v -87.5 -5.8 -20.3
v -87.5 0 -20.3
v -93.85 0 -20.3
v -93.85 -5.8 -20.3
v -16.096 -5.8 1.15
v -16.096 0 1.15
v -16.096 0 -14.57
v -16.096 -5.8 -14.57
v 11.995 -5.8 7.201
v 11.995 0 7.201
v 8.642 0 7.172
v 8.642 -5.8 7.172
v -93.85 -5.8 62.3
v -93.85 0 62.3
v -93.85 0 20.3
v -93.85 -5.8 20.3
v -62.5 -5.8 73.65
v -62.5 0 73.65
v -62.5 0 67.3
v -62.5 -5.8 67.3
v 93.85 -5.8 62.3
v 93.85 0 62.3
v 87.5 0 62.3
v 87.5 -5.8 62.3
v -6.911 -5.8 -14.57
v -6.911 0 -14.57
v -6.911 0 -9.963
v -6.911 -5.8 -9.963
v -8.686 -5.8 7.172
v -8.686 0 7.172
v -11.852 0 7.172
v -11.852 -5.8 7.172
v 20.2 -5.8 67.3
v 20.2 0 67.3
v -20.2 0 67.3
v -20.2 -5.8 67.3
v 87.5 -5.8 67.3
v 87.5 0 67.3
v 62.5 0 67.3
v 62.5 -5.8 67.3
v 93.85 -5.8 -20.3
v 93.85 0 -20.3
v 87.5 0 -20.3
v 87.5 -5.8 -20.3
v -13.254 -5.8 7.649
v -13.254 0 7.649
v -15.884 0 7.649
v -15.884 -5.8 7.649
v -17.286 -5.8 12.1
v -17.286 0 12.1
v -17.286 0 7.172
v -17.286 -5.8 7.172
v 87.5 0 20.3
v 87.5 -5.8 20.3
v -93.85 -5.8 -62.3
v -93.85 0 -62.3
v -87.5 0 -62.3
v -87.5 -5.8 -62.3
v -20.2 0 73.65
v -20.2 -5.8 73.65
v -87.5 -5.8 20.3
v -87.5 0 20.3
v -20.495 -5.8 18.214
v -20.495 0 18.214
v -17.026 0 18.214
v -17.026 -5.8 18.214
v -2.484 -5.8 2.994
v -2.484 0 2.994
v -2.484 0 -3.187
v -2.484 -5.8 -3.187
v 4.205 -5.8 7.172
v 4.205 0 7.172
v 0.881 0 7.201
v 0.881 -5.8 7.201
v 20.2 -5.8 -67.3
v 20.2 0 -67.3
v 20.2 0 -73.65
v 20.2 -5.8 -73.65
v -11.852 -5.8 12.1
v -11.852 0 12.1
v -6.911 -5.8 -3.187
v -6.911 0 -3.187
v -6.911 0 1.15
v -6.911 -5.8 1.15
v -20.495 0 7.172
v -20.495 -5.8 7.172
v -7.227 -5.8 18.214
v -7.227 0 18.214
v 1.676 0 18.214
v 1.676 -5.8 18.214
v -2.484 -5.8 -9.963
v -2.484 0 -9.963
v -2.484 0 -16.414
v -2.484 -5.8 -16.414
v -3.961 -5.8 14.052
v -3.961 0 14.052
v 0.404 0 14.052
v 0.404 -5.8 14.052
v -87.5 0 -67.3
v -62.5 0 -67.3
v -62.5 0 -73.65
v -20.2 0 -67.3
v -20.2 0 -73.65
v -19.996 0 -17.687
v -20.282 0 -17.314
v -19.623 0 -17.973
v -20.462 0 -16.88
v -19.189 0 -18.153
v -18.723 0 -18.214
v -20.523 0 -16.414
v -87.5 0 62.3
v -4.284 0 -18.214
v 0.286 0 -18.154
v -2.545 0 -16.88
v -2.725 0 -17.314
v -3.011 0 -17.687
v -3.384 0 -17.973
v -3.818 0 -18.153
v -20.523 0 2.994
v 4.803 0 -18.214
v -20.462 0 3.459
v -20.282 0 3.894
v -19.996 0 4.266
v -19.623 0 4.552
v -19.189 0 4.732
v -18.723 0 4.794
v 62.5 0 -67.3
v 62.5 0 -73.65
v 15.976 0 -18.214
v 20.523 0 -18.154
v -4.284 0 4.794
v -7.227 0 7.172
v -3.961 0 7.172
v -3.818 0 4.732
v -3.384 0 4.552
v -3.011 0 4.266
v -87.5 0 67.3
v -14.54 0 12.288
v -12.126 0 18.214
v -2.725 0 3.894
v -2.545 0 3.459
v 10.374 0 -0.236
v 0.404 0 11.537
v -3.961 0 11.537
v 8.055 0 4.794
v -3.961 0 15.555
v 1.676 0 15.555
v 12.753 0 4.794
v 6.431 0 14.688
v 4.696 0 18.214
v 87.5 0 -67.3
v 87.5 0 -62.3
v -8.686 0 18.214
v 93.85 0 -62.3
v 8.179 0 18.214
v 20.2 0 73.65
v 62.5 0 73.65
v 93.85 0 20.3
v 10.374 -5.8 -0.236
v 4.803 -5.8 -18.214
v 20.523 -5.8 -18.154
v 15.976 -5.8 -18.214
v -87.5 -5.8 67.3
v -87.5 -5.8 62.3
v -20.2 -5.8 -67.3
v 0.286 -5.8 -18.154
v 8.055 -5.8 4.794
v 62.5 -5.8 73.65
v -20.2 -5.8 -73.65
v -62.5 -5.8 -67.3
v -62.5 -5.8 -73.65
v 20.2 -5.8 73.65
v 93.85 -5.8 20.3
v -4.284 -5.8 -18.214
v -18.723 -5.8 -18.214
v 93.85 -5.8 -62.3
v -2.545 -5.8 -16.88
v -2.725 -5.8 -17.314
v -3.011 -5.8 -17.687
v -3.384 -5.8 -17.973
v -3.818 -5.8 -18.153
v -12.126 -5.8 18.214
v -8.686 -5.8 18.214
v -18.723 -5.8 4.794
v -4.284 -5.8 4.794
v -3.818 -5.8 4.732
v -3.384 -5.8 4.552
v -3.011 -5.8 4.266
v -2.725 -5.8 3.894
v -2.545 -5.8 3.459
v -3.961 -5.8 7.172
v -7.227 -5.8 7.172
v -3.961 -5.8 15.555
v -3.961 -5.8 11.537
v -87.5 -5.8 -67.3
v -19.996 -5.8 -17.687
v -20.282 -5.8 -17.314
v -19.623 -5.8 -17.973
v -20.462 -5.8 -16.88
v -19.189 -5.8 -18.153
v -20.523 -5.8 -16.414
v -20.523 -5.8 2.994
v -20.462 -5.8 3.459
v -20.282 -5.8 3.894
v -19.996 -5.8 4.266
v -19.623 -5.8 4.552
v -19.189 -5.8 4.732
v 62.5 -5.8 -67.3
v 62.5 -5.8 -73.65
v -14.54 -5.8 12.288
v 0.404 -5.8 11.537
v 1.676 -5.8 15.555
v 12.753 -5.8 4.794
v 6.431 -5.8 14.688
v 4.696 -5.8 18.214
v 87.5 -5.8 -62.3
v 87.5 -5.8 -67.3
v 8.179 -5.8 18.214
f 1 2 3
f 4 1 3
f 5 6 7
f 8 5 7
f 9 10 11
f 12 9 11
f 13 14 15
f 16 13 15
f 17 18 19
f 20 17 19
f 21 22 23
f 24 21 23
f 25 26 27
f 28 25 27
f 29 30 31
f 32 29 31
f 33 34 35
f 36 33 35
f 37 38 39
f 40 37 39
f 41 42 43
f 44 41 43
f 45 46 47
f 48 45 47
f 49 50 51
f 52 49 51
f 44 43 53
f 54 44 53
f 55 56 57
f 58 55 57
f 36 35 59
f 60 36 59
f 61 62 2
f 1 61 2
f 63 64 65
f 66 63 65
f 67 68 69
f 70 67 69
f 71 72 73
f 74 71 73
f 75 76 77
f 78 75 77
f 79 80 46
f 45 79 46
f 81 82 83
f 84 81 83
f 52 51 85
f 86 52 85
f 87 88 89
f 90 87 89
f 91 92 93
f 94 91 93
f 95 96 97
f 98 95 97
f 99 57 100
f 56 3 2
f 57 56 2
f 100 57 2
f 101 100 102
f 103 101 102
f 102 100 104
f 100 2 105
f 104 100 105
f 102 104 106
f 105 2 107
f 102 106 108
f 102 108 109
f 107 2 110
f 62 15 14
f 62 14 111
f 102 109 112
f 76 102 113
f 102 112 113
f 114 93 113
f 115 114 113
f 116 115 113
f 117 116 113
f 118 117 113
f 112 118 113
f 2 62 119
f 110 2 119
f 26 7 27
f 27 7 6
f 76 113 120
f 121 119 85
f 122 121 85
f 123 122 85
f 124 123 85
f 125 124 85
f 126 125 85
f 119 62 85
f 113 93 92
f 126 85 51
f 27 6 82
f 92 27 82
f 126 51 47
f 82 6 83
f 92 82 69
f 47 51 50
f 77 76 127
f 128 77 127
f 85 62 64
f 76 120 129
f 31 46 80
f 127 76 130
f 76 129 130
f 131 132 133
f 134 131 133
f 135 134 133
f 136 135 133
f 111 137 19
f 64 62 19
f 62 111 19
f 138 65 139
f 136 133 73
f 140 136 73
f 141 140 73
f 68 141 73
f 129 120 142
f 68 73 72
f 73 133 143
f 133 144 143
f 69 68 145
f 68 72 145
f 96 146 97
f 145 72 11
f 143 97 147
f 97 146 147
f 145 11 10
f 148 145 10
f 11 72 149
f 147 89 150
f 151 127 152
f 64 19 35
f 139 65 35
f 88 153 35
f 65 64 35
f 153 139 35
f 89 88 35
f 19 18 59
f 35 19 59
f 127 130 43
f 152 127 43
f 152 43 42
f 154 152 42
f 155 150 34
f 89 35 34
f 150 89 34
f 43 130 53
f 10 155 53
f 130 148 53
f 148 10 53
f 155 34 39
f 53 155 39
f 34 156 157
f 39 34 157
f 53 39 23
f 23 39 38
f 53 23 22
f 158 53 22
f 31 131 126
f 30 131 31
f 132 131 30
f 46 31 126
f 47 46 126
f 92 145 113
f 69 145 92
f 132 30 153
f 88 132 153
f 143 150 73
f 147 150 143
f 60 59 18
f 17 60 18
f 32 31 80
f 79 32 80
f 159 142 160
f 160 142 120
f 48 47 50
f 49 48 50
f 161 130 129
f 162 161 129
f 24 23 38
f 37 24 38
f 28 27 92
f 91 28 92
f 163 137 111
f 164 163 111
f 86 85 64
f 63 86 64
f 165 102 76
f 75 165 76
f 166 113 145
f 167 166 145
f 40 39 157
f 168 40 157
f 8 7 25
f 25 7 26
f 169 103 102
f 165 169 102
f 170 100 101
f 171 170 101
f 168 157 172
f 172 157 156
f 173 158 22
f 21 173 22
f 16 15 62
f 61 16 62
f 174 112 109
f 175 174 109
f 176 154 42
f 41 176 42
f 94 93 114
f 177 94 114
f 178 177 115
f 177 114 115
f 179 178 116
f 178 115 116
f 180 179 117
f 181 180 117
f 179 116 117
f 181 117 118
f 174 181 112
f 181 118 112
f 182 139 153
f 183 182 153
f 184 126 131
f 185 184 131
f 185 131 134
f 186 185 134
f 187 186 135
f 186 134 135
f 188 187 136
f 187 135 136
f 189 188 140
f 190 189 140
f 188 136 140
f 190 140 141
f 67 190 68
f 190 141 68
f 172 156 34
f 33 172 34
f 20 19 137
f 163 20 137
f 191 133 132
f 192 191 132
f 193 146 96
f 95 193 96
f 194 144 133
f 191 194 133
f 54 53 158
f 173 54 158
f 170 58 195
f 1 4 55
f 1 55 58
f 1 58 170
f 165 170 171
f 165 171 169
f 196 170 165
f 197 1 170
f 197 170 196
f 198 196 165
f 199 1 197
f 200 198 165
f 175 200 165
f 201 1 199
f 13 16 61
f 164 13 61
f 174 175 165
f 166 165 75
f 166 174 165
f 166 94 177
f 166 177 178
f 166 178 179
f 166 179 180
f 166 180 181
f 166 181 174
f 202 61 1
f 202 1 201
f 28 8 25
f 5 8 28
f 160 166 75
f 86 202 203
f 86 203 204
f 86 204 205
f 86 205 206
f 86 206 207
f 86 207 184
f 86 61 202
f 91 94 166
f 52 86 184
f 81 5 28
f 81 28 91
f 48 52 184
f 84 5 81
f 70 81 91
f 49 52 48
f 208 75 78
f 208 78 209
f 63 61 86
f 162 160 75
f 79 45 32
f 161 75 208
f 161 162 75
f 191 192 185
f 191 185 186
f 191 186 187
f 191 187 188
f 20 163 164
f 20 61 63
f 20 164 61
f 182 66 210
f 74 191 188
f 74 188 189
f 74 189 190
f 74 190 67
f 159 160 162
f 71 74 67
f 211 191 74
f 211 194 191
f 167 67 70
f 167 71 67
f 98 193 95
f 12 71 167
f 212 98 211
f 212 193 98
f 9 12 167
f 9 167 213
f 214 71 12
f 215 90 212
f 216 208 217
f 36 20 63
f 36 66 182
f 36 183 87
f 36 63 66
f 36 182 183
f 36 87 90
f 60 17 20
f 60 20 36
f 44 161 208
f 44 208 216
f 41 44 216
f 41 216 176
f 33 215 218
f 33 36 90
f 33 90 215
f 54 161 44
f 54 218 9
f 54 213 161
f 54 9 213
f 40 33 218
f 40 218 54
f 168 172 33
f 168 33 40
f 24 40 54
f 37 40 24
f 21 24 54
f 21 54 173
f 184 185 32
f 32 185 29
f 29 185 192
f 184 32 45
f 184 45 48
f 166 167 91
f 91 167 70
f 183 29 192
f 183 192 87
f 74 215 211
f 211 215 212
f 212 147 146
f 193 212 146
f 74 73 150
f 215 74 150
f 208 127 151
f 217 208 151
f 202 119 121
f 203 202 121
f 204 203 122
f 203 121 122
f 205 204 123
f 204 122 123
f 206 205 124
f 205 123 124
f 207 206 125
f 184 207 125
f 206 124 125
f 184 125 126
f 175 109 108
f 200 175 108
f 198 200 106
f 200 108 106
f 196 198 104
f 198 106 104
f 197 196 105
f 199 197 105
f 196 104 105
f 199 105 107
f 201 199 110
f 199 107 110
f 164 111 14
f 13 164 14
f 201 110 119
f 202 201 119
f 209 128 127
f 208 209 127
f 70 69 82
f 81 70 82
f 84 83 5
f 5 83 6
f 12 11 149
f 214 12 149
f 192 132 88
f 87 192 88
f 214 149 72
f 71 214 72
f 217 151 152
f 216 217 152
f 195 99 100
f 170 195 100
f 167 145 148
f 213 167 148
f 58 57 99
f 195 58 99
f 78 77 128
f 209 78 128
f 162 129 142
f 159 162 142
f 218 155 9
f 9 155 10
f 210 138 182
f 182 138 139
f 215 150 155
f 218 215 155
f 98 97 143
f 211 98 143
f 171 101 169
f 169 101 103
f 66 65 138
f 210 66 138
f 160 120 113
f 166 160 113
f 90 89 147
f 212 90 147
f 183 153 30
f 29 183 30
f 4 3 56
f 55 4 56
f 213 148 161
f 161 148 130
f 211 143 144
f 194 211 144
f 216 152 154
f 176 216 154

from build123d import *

# Parameters (mm, degrees)
F1_DEPTH = 5.8


with BuildPart() as f1:
    # F0 (on Front) → F1 (new body)
    with BuildSketch(Plane.XZ):
        Polygon((87.5, 62.3), (87.5, 67.3), (62.5, 67.3), (62.5, 73.65), (20.2, 73.65), (20.2, 67.3), (-20.2, 67.3), (-20.2, 73.65), (-62.5, 73.65), (-62.5, 67.3), (-87.5, 67.3), (-87.5, 62.3), (-93.85, 62.3), (-93.85, 20.3), (-87.5, 20.3), (-87.5, -20.3), (-93.85, -20.3), (-93.85, -62.3), (-87.5, -62.3), (-87.5, -67.3), (-62.5, -67.3), (-62.5, -73.65), (-20.2, -73.65), (-20.2, -67.3), (20.2, -67.3), (20.2, -73.65), (62.5, -73.65), (62.5, -67.3), (87.5, -67.3), (87.5, -62.3), (93.85, -62.3), (93.85, -20.3), (87.5, -20.3), (87.5, 20.3), (93.85, 20.3), (93.85, 62.3), align=None)
        with BuildLine():
            ThreePointArc((-2.48414, -16.414051), (-3.011348, -17.686843), (-4.28414, -18.214051))
            Line((-4.28414, -18.214051), (-18.722851, -18.214053))
            ThreePointArc((-18.722851, -18.214053), (-19.995643, -17.686845), (-20.522851, -16.414053))
            Line((-20.522851, -16.414053), (-20.522851, 2.993572))
            ThreePointArc((-20.522851, 2.993572), (-19.995643, 4.266364), (-18.722851, 4.793572))
            Line((-18.722851, 4.793572), (-4.28414, 4.79357))
            ThreePointArc((-4.28414, 4.79357), (-3.011348, 4.266362), (-2.48414, 2.99357))
            Line((-2.48414, 2.99357), (-2.48414, -3.186868))
            Line((-2.48414, -3.186868), (-6.911026, -3.186868))
            Line((-6.911026, -3.186868), (-6.911026, 1.14975))
            Line((-6.911026, 1.14975), (-16.095965, 1.14975))
            Line((-16.095965, 1.14975), (-16.095965, -14.57023))
            Line((-16.095965, -14.57023), (-6.911026, -14.57023))
            Line((-6.911026, -14.57023), (-6.911026, -9.962669))
            Line((-6.911026, -9.962669), (-2.48414, -9.962669))
            Line((-2.48414, -9.962669), (-2.48414, -16.414051))
        make_face(mode=Mode.SUBTRACT)
        Polygon((4.802941, -18.214051), (0.285788, -18.153826), (8.05544, 4.793572), (12.753269, 4.793572), (20.522851, -18.153826), (15.975515, -18.214051), (10.374172, -0.235564), align=None, mode=Mode.SUBTRACT)
        Polygon((-17.285935, 7.171967), (-20.494564, 7.171967), (-20.494564, 18.214053), (-17.025802, 18.214053), (-14.539873, 12.288281), (-12.126241, 18.214053), (-8.686399, 18.214053), (-8.686399, 7.171967), (-11.851649, 7.171967), (-11.851649, 12.100447), (-13.253599, 7.648853), (-15.884055, 7.648853), (-17.285935, 12.100447), align=None, mode=Mode.SUBTRACT)
        Polygon((-3.960774, 11.536803), (-3.960774, 7.171967), (-7.227172, 7.171967), (-7.227172, 18.214053), (1.675946, 18.214053), (1.675946, 15.554749), (-3.960774, 15.554749), (-3.960774, 14.051651), (0.404062, 14.051651), (0.404062, 11.536803), align=None, mode=Mode.SUBTRACT)
        Polygon((4.204833, 7.171967), (0.880667, 7.200886), (4.696249, 18.214053), (8.1794, 18.214053), (11.995052, 7.200886), (8.641967, 7.171967), (6.43063, 14.687593), align=None, mode=Mode.SUBTRACT)
    extrude(amount=F1_DEPTH)


solid = f1.part
